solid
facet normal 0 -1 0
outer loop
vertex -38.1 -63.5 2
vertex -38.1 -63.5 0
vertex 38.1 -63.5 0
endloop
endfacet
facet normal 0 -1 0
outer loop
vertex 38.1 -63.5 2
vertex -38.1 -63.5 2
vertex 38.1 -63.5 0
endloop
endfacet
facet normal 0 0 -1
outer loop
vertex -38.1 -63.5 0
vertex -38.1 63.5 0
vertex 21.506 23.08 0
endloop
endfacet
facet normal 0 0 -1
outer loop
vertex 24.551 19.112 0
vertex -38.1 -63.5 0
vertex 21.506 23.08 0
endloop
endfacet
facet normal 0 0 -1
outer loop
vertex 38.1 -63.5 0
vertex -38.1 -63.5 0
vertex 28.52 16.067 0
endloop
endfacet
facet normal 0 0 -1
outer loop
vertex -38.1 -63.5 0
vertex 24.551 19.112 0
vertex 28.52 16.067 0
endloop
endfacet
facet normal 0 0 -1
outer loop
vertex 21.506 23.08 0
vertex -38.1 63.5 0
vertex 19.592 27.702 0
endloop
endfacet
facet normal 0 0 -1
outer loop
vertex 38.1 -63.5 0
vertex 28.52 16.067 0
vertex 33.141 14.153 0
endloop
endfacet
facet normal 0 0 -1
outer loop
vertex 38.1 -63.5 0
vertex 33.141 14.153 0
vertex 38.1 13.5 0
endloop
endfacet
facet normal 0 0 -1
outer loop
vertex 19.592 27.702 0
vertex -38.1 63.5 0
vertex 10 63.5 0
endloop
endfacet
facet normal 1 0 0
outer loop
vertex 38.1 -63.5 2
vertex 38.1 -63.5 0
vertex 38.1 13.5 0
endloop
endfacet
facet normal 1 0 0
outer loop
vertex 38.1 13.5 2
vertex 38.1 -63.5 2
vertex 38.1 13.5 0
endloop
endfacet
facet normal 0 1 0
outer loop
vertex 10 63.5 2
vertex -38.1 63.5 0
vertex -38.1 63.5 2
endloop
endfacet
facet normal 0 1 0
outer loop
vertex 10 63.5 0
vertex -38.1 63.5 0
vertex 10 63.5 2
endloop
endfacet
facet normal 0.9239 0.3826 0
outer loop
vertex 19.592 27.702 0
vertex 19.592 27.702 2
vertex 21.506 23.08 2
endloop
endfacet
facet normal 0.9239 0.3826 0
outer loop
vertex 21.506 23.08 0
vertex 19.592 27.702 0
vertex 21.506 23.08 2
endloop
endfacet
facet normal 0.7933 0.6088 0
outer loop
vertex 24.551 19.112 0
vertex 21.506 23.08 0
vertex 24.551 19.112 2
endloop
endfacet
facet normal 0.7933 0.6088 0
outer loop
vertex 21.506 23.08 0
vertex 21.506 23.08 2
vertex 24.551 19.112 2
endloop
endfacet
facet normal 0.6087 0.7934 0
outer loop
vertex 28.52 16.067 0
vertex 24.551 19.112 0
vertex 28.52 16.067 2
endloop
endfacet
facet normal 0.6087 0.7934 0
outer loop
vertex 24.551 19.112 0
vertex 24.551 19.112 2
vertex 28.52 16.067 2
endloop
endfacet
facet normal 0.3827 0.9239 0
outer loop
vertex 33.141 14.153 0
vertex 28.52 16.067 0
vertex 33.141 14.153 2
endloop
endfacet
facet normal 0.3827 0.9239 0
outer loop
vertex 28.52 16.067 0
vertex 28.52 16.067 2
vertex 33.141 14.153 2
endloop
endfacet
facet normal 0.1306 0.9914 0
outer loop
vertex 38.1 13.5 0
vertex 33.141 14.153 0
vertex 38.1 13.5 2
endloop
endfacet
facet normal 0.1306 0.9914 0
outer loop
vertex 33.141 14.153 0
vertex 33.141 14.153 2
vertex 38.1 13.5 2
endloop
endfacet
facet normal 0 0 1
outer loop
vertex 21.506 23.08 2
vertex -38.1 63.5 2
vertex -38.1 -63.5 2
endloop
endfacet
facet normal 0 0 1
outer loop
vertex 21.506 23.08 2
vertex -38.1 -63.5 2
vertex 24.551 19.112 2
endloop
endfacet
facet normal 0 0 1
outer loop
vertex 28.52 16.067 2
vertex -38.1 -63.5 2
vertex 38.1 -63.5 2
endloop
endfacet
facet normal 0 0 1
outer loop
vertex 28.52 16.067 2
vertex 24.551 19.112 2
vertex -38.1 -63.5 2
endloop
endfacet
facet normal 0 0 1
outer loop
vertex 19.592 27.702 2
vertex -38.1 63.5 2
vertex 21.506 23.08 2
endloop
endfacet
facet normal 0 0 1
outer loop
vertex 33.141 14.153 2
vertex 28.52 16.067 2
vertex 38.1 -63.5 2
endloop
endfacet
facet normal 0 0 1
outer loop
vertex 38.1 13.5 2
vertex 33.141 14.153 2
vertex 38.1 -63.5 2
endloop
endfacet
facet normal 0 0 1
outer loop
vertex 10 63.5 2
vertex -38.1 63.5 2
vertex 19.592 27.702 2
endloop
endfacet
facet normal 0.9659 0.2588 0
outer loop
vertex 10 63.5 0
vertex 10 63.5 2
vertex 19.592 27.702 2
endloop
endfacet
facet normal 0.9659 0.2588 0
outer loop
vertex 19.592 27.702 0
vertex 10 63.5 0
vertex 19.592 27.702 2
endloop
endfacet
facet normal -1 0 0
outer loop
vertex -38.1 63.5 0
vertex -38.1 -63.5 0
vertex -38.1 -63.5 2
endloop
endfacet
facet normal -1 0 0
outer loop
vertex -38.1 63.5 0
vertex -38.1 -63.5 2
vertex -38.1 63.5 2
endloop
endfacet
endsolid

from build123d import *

# Parameters (mm, degrees)
F0_W     = 76.2
F0_H     = 127
F1_DEPTH = 2
F3_DEPTH = 25


with BuildPart() as f1:
    # F0 (on Top) → F1 (new body)
    with BuildSketch(Plane.XY):
        Rectangle(F0_W, F0_H)
    extrude(amount=F1_DEPTH)

    # F2 (on face) → F3 (cut)
    with BuildSketch(Plane.XY.offset(2)):
        with BuildLine():
            Line((38.1, 63.5), (10, 63.5))
            Line((10, 63.5), (19.592162, 27.701563))
            ThreePointArc((19.592162, 27.701563), (26.43569, 17.4595), (38.1, 13.5))
            Line((38.1, 13.5), (38.1, 63.5))
        make_face()
    extrude(amount=-F3_DEPTH, mode=Mode.SUBTRACT)


solid = f1.part
